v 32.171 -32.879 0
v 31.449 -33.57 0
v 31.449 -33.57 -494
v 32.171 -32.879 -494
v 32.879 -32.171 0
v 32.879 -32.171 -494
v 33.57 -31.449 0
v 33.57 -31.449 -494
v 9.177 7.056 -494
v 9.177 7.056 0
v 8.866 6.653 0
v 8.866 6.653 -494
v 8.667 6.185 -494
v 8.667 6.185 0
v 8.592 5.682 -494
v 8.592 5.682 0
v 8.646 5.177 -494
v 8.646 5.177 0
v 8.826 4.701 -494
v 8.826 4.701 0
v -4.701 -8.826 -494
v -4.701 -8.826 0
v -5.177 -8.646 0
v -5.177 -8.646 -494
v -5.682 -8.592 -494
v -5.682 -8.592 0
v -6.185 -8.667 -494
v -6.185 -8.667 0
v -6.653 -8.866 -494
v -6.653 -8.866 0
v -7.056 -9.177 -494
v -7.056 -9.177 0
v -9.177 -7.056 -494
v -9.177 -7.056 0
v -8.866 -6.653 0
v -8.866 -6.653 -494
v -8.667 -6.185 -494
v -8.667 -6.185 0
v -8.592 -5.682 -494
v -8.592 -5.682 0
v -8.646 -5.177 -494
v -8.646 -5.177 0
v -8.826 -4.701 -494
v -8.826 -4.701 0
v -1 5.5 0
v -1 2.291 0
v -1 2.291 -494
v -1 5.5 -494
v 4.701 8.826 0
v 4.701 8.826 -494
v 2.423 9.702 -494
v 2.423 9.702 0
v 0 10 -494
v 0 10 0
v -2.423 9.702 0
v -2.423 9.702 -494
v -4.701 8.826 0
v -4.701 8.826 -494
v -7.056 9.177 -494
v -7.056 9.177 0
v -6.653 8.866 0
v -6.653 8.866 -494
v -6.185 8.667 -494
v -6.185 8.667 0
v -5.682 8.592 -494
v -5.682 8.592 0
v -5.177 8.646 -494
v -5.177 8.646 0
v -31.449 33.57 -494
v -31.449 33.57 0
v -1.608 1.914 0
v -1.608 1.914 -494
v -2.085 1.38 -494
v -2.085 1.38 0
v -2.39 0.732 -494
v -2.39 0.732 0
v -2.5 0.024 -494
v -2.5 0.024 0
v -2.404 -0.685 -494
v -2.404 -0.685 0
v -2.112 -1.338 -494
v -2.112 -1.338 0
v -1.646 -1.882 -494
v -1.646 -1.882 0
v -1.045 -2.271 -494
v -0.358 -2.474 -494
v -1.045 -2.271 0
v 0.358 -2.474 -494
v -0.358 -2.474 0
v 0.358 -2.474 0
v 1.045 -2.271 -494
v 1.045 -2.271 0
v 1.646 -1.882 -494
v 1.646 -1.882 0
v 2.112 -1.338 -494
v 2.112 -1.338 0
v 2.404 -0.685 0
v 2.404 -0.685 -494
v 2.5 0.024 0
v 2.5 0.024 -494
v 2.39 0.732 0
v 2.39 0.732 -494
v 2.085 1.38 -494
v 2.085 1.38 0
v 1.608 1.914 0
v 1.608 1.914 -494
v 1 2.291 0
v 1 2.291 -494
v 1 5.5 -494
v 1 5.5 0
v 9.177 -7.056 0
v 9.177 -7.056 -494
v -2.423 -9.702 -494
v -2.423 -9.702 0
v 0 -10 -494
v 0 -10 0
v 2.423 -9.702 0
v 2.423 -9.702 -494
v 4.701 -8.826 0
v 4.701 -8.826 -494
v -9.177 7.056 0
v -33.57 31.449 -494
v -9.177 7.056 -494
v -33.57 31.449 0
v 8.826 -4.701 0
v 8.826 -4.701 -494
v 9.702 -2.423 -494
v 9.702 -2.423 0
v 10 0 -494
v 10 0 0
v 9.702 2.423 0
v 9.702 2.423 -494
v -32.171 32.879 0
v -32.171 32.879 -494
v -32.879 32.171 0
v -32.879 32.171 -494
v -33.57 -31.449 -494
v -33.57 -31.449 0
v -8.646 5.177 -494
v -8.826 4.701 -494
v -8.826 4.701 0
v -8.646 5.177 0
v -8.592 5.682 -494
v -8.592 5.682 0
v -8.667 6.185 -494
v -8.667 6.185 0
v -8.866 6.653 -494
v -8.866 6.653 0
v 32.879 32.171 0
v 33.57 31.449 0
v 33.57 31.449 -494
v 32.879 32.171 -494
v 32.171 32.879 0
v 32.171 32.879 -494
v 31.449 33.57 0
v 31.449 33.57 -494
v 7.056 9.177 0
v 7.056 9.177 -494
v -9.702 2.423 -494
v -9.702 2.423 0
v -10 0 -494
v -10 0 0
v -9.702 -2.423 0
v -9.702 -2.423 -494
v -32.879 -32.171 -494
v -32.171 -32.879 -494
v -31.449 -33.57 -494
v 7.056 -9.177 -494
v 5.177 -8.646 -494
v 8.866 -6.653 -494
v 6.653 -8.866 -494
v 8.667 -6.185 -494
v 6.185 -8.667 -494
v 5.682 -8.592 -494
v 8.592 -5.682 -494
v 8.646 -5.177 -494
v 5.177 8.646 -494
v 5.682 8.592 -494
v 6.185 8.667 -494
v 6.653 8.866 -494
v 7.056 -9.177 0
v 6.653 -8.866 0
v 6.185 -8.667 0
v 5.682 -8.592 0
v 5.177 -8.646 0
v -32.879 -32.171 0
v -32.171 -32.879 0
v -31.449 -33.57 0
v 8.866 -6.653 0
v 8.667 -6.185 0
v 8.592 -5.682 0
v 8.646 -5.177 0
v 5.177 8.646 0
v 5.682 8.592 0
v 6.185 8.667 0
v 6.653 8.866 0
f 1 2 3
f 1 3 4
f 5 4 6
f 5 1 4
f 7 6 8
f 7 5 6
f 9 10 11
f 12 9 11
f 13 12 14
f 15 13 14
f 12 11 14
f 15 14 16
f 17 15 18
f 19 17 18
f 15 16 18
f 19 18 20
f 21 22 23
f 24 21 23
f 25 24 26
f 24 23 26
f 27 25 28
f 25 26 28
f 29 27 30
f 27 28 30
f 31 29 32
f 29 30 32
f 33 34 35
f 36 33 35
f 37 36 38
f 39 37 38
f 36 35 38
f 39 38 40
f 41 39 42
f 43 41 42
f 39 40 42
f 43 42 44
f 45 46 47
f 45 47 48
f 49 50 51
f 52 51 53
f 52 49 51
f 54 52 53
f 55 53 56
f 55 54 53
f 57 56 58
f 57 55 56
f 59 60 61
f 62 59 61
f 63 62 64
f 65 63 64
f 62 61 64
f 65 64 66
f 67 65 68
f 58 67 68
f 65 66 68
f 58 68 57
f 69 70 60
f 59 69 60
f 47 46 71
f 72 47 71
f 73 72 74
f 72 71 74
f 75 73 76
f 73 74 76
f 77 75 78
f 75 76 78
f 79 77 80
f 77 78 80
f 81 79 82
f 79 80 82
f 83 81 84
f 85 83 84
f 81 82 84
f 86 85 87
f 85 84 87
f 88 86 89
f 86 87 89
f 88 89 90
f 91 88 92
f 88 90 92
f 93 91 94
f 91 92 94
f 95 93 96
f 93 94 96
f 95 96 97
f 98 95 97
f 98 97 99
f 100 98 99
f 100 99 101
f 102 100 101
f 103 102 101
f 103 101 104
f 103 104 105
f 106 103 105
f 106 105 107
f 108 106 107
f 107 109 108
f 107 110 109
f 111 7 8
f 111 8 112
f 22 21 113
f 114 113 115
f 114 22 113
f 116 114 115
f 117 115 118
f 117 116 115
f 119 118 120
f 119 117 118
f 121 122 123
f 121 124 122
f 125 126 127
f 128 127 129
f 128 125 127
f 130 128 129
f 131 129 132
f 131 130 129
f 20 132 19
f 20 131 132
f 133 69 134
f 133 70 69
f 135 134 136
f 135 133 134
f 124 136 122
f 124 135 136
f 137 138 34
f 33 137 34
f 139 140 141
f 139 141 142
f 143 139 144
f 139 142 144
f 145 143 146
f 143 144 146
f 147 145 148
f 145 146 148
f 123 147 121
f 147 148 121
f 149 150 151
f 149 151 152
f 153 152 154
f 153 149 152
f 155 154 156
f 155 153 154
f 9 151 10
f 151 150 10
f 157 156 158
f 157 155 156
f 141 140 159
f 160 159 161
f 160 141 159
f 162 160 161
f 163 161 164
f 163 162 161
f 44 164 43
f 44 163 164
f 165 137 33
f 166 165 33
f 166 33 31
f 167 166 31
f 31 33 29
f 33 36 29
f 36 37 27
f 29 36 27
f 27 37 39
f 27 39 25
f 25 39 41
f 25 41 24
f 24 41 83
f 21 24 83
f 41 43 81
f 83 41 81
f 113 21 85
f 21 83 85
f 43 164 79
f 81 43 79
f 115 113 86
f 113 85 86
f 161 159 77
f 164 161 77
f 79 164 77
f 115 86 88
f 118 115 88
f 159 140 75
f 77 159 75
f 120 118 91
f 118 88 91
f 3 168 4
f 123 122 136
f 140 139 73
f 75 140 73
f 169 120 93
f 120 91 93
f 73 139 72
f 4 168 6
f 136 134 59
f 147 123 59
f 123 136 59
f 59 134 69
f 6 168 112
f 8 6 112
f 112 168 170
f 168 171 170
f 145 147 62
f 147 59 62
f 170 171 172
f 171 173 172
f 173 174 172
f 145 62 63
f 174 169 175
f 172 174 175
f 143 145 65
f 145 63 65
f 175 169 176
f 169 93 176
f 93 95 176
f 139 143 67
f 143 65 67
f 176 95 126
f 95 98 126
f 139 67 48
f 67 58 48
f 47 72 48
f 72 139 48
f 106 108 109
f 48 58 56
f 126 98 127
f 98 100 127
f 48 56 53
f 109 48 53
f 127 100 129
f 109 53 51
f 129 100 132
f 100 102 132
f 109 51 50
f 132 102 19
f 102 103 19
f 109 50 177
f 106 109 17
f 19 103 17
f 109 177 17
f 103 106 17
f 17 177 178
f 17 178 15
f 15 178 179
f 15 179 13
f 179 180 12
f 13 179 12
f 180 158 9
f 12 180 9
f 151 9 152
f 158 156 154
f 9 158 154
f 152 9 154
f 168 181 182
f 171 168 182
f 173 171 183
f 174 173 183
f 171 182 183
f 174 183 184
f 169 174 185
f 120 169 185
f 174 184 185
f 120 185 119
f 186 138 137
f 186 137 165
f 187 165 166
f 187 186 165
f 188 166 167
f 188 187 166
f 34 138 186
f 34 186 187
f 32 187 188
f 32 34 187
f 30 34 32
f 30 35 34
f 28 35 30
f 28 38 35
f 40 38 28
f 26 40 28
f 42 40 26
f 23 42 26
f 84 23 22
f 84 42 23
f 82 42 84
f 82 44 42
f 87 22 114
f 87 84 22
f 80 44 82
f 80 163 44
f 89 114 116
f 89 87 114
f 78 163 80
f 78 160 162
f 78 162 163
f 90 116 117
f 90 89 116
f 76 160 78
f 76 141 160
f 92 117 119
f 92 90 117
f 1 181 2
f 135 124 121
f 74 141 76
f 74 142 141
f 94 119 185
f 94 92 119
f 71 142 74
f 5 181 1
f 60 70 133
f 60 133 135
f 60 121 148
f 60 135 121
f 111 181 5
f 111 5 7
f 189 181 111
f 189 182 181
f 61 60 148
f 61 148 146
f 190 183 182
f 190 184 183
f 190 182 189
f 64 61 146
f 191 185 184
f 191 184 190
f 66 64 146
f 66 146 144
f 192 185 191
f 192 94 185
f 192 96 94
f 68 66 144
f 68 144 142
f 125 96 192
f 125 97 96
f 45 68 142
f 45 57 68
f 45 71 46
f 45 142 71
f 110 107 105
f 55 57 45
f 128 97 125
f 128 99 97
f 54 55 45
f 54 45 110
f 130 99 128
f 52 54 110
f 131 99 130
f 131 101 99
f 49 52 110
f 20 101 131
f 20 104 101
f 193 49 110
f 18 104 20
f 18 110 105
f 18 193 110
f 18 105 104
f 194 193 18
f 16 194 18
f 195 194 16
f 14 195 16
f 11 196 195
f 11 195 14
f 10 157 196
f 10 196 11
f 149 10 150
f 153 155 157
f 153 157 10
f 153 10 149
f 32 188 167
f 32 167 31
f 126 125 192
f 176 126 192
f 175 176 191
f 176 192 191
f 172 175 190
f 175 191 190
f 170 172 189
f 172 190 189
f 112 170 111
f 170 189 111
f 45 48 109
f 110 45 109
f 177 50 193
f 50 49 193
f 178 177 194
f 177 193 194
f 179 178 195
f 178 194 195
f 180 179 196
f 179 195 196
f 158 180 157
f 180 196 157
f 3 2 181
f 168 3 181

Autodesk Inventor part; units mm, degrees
ref_plane "YZ Plane" through (0, 0, 0) normal (1, 0, 0) x (0, 1, 0)
ref_plane "XZ Plane" through (0, 0, 0) normal (0, 1, 0) x (-1, 0, 0)
ref_plane "XY Plane" through (0, 0, 0) normal (0, 0, 1) x (1, 0, 0)
sketch "Sketch1" plane through (0, 0, 0) normal (0, 0, 1) x (1, 0, 0)
  arc A0 (-1, 2.2913) -> (1, 2.2913) centre (0, 0) ccw
  line L0 (33.5703, 31.449) -> (9.177, 7.0557)
  line L1 (31.449, 33.5703) -> (7.0557, 9.177)
  line L2 (-33.5703, 31.449) -> (-9.177, 7.0557)
  line L3 (-31.449, 33.5703) -> (-7.0557, 9.177)
  line L4 (33.5703, -31.449) -> (9.177, -7.0557)
  line L5 (31.449, -33.5703) -> (7.0557, -9.177)
  line L6 (-33.5703, -31.449) -> (-9.177, -7.0557)
  line L7 (-31.449, -33.5703) -> (-7.0557, -9.177)
  arc A1 (-31.449, 33.5703) -> (-33.5703, 31.449) centre (0, 0) ccw
  arc A2 (33.5703, 31.449) -> (31.449, 33.5703) centre (0, 0) ccw
  arc A3 (-33.5703, -31.449) -> (-31.449, -33.5703) centre (0, 0) ccw
  arc A4 (31.449, -33.5703) -> (33.5703, -31.449) centre (0, 0) ccw
  arc A5 (-8.826, 4.7012) -> (-8.826, -4.7012) centre (0, 0) ccw
  arc A6 (-4.7012, -8.826) -> (4.7012, -8.826) centre (0, 0) ccw
  arc A7 (8.826, -4.7012) -> (8.826, 4.7012) centre (0, 0) ccw
  arc A8 (4.7012, 8.826) -> (-4.7012, 8.826) centre (0, 0) ccw
  arc A9 (-8.826, 4.7012) -> (-9.177, 7.0557) centre (-10.5912, 5.6415) ccw
  arc A10 (-9.177, -7.0557) -> (-8.826, -4.7012) centre (-10.5912, -5.6415) ccw
  arc A11 (-4.7012, -8.826) -> (-7.0557, -9.177) centre (-5.6415, -10.5912) ccw
  arc A12 (7.0557, -9.177) -> (4.7012, -8.826) centre (5.6415, -10.5912) ccw
  arc A13 (8.826, -4.7012) -> (9.177, -7.0557) centre (10.5912, -5.6415) ccw
  arc A14 (9.177, 7.0557) -> (8.826, 4.7012) centre (10.5912, 5.6415) ccw
  arc A15 (4.7012, 8.826) -> (7.0557, 9.177) centre (5.6415, 10.5912) ccw
  arc A16 (-7.0557, 9.177) -> (-4.7012, 8.826) centre (-5.6415, 10.5912) ccw
  line L8 (-1, 5.5) -> (1, 5.5)
  line L9 (1, 5.5) -> (1, 2.2913)
  line L10 (-1, 2.2913) -> (-1, 5.5)
  line L11 (-1, 5.5) -> (1, 2.5) construction
  line L12 (1, 5.5) -> (-1, 2.5) construction
  point P0 (8.0517, 5.9304)
  point P1 (5.9304, 8.0517)
  point P2 (-8.0517, 5.9304)
  point P3 (-5.9304, 8.0517)
  point P4 (8.0517, -5.9304)
  point P5 (5.9304, -8.0517)
  point P6 (-8.0517, -5.9304)
  point P7 (-5.9304, -8.0517)
  point P8 (0, 4)
  dimension "d0" = 5
  dimension "d10" = 2
  dimension "d18" = 46
  dimension "d19" = 46
  dimension "d20" = 46
  dimension "d21" = 46
extrude "Extrusion2" add sketch "Sketch1" against normal blind 494
properties part number "propeller"
